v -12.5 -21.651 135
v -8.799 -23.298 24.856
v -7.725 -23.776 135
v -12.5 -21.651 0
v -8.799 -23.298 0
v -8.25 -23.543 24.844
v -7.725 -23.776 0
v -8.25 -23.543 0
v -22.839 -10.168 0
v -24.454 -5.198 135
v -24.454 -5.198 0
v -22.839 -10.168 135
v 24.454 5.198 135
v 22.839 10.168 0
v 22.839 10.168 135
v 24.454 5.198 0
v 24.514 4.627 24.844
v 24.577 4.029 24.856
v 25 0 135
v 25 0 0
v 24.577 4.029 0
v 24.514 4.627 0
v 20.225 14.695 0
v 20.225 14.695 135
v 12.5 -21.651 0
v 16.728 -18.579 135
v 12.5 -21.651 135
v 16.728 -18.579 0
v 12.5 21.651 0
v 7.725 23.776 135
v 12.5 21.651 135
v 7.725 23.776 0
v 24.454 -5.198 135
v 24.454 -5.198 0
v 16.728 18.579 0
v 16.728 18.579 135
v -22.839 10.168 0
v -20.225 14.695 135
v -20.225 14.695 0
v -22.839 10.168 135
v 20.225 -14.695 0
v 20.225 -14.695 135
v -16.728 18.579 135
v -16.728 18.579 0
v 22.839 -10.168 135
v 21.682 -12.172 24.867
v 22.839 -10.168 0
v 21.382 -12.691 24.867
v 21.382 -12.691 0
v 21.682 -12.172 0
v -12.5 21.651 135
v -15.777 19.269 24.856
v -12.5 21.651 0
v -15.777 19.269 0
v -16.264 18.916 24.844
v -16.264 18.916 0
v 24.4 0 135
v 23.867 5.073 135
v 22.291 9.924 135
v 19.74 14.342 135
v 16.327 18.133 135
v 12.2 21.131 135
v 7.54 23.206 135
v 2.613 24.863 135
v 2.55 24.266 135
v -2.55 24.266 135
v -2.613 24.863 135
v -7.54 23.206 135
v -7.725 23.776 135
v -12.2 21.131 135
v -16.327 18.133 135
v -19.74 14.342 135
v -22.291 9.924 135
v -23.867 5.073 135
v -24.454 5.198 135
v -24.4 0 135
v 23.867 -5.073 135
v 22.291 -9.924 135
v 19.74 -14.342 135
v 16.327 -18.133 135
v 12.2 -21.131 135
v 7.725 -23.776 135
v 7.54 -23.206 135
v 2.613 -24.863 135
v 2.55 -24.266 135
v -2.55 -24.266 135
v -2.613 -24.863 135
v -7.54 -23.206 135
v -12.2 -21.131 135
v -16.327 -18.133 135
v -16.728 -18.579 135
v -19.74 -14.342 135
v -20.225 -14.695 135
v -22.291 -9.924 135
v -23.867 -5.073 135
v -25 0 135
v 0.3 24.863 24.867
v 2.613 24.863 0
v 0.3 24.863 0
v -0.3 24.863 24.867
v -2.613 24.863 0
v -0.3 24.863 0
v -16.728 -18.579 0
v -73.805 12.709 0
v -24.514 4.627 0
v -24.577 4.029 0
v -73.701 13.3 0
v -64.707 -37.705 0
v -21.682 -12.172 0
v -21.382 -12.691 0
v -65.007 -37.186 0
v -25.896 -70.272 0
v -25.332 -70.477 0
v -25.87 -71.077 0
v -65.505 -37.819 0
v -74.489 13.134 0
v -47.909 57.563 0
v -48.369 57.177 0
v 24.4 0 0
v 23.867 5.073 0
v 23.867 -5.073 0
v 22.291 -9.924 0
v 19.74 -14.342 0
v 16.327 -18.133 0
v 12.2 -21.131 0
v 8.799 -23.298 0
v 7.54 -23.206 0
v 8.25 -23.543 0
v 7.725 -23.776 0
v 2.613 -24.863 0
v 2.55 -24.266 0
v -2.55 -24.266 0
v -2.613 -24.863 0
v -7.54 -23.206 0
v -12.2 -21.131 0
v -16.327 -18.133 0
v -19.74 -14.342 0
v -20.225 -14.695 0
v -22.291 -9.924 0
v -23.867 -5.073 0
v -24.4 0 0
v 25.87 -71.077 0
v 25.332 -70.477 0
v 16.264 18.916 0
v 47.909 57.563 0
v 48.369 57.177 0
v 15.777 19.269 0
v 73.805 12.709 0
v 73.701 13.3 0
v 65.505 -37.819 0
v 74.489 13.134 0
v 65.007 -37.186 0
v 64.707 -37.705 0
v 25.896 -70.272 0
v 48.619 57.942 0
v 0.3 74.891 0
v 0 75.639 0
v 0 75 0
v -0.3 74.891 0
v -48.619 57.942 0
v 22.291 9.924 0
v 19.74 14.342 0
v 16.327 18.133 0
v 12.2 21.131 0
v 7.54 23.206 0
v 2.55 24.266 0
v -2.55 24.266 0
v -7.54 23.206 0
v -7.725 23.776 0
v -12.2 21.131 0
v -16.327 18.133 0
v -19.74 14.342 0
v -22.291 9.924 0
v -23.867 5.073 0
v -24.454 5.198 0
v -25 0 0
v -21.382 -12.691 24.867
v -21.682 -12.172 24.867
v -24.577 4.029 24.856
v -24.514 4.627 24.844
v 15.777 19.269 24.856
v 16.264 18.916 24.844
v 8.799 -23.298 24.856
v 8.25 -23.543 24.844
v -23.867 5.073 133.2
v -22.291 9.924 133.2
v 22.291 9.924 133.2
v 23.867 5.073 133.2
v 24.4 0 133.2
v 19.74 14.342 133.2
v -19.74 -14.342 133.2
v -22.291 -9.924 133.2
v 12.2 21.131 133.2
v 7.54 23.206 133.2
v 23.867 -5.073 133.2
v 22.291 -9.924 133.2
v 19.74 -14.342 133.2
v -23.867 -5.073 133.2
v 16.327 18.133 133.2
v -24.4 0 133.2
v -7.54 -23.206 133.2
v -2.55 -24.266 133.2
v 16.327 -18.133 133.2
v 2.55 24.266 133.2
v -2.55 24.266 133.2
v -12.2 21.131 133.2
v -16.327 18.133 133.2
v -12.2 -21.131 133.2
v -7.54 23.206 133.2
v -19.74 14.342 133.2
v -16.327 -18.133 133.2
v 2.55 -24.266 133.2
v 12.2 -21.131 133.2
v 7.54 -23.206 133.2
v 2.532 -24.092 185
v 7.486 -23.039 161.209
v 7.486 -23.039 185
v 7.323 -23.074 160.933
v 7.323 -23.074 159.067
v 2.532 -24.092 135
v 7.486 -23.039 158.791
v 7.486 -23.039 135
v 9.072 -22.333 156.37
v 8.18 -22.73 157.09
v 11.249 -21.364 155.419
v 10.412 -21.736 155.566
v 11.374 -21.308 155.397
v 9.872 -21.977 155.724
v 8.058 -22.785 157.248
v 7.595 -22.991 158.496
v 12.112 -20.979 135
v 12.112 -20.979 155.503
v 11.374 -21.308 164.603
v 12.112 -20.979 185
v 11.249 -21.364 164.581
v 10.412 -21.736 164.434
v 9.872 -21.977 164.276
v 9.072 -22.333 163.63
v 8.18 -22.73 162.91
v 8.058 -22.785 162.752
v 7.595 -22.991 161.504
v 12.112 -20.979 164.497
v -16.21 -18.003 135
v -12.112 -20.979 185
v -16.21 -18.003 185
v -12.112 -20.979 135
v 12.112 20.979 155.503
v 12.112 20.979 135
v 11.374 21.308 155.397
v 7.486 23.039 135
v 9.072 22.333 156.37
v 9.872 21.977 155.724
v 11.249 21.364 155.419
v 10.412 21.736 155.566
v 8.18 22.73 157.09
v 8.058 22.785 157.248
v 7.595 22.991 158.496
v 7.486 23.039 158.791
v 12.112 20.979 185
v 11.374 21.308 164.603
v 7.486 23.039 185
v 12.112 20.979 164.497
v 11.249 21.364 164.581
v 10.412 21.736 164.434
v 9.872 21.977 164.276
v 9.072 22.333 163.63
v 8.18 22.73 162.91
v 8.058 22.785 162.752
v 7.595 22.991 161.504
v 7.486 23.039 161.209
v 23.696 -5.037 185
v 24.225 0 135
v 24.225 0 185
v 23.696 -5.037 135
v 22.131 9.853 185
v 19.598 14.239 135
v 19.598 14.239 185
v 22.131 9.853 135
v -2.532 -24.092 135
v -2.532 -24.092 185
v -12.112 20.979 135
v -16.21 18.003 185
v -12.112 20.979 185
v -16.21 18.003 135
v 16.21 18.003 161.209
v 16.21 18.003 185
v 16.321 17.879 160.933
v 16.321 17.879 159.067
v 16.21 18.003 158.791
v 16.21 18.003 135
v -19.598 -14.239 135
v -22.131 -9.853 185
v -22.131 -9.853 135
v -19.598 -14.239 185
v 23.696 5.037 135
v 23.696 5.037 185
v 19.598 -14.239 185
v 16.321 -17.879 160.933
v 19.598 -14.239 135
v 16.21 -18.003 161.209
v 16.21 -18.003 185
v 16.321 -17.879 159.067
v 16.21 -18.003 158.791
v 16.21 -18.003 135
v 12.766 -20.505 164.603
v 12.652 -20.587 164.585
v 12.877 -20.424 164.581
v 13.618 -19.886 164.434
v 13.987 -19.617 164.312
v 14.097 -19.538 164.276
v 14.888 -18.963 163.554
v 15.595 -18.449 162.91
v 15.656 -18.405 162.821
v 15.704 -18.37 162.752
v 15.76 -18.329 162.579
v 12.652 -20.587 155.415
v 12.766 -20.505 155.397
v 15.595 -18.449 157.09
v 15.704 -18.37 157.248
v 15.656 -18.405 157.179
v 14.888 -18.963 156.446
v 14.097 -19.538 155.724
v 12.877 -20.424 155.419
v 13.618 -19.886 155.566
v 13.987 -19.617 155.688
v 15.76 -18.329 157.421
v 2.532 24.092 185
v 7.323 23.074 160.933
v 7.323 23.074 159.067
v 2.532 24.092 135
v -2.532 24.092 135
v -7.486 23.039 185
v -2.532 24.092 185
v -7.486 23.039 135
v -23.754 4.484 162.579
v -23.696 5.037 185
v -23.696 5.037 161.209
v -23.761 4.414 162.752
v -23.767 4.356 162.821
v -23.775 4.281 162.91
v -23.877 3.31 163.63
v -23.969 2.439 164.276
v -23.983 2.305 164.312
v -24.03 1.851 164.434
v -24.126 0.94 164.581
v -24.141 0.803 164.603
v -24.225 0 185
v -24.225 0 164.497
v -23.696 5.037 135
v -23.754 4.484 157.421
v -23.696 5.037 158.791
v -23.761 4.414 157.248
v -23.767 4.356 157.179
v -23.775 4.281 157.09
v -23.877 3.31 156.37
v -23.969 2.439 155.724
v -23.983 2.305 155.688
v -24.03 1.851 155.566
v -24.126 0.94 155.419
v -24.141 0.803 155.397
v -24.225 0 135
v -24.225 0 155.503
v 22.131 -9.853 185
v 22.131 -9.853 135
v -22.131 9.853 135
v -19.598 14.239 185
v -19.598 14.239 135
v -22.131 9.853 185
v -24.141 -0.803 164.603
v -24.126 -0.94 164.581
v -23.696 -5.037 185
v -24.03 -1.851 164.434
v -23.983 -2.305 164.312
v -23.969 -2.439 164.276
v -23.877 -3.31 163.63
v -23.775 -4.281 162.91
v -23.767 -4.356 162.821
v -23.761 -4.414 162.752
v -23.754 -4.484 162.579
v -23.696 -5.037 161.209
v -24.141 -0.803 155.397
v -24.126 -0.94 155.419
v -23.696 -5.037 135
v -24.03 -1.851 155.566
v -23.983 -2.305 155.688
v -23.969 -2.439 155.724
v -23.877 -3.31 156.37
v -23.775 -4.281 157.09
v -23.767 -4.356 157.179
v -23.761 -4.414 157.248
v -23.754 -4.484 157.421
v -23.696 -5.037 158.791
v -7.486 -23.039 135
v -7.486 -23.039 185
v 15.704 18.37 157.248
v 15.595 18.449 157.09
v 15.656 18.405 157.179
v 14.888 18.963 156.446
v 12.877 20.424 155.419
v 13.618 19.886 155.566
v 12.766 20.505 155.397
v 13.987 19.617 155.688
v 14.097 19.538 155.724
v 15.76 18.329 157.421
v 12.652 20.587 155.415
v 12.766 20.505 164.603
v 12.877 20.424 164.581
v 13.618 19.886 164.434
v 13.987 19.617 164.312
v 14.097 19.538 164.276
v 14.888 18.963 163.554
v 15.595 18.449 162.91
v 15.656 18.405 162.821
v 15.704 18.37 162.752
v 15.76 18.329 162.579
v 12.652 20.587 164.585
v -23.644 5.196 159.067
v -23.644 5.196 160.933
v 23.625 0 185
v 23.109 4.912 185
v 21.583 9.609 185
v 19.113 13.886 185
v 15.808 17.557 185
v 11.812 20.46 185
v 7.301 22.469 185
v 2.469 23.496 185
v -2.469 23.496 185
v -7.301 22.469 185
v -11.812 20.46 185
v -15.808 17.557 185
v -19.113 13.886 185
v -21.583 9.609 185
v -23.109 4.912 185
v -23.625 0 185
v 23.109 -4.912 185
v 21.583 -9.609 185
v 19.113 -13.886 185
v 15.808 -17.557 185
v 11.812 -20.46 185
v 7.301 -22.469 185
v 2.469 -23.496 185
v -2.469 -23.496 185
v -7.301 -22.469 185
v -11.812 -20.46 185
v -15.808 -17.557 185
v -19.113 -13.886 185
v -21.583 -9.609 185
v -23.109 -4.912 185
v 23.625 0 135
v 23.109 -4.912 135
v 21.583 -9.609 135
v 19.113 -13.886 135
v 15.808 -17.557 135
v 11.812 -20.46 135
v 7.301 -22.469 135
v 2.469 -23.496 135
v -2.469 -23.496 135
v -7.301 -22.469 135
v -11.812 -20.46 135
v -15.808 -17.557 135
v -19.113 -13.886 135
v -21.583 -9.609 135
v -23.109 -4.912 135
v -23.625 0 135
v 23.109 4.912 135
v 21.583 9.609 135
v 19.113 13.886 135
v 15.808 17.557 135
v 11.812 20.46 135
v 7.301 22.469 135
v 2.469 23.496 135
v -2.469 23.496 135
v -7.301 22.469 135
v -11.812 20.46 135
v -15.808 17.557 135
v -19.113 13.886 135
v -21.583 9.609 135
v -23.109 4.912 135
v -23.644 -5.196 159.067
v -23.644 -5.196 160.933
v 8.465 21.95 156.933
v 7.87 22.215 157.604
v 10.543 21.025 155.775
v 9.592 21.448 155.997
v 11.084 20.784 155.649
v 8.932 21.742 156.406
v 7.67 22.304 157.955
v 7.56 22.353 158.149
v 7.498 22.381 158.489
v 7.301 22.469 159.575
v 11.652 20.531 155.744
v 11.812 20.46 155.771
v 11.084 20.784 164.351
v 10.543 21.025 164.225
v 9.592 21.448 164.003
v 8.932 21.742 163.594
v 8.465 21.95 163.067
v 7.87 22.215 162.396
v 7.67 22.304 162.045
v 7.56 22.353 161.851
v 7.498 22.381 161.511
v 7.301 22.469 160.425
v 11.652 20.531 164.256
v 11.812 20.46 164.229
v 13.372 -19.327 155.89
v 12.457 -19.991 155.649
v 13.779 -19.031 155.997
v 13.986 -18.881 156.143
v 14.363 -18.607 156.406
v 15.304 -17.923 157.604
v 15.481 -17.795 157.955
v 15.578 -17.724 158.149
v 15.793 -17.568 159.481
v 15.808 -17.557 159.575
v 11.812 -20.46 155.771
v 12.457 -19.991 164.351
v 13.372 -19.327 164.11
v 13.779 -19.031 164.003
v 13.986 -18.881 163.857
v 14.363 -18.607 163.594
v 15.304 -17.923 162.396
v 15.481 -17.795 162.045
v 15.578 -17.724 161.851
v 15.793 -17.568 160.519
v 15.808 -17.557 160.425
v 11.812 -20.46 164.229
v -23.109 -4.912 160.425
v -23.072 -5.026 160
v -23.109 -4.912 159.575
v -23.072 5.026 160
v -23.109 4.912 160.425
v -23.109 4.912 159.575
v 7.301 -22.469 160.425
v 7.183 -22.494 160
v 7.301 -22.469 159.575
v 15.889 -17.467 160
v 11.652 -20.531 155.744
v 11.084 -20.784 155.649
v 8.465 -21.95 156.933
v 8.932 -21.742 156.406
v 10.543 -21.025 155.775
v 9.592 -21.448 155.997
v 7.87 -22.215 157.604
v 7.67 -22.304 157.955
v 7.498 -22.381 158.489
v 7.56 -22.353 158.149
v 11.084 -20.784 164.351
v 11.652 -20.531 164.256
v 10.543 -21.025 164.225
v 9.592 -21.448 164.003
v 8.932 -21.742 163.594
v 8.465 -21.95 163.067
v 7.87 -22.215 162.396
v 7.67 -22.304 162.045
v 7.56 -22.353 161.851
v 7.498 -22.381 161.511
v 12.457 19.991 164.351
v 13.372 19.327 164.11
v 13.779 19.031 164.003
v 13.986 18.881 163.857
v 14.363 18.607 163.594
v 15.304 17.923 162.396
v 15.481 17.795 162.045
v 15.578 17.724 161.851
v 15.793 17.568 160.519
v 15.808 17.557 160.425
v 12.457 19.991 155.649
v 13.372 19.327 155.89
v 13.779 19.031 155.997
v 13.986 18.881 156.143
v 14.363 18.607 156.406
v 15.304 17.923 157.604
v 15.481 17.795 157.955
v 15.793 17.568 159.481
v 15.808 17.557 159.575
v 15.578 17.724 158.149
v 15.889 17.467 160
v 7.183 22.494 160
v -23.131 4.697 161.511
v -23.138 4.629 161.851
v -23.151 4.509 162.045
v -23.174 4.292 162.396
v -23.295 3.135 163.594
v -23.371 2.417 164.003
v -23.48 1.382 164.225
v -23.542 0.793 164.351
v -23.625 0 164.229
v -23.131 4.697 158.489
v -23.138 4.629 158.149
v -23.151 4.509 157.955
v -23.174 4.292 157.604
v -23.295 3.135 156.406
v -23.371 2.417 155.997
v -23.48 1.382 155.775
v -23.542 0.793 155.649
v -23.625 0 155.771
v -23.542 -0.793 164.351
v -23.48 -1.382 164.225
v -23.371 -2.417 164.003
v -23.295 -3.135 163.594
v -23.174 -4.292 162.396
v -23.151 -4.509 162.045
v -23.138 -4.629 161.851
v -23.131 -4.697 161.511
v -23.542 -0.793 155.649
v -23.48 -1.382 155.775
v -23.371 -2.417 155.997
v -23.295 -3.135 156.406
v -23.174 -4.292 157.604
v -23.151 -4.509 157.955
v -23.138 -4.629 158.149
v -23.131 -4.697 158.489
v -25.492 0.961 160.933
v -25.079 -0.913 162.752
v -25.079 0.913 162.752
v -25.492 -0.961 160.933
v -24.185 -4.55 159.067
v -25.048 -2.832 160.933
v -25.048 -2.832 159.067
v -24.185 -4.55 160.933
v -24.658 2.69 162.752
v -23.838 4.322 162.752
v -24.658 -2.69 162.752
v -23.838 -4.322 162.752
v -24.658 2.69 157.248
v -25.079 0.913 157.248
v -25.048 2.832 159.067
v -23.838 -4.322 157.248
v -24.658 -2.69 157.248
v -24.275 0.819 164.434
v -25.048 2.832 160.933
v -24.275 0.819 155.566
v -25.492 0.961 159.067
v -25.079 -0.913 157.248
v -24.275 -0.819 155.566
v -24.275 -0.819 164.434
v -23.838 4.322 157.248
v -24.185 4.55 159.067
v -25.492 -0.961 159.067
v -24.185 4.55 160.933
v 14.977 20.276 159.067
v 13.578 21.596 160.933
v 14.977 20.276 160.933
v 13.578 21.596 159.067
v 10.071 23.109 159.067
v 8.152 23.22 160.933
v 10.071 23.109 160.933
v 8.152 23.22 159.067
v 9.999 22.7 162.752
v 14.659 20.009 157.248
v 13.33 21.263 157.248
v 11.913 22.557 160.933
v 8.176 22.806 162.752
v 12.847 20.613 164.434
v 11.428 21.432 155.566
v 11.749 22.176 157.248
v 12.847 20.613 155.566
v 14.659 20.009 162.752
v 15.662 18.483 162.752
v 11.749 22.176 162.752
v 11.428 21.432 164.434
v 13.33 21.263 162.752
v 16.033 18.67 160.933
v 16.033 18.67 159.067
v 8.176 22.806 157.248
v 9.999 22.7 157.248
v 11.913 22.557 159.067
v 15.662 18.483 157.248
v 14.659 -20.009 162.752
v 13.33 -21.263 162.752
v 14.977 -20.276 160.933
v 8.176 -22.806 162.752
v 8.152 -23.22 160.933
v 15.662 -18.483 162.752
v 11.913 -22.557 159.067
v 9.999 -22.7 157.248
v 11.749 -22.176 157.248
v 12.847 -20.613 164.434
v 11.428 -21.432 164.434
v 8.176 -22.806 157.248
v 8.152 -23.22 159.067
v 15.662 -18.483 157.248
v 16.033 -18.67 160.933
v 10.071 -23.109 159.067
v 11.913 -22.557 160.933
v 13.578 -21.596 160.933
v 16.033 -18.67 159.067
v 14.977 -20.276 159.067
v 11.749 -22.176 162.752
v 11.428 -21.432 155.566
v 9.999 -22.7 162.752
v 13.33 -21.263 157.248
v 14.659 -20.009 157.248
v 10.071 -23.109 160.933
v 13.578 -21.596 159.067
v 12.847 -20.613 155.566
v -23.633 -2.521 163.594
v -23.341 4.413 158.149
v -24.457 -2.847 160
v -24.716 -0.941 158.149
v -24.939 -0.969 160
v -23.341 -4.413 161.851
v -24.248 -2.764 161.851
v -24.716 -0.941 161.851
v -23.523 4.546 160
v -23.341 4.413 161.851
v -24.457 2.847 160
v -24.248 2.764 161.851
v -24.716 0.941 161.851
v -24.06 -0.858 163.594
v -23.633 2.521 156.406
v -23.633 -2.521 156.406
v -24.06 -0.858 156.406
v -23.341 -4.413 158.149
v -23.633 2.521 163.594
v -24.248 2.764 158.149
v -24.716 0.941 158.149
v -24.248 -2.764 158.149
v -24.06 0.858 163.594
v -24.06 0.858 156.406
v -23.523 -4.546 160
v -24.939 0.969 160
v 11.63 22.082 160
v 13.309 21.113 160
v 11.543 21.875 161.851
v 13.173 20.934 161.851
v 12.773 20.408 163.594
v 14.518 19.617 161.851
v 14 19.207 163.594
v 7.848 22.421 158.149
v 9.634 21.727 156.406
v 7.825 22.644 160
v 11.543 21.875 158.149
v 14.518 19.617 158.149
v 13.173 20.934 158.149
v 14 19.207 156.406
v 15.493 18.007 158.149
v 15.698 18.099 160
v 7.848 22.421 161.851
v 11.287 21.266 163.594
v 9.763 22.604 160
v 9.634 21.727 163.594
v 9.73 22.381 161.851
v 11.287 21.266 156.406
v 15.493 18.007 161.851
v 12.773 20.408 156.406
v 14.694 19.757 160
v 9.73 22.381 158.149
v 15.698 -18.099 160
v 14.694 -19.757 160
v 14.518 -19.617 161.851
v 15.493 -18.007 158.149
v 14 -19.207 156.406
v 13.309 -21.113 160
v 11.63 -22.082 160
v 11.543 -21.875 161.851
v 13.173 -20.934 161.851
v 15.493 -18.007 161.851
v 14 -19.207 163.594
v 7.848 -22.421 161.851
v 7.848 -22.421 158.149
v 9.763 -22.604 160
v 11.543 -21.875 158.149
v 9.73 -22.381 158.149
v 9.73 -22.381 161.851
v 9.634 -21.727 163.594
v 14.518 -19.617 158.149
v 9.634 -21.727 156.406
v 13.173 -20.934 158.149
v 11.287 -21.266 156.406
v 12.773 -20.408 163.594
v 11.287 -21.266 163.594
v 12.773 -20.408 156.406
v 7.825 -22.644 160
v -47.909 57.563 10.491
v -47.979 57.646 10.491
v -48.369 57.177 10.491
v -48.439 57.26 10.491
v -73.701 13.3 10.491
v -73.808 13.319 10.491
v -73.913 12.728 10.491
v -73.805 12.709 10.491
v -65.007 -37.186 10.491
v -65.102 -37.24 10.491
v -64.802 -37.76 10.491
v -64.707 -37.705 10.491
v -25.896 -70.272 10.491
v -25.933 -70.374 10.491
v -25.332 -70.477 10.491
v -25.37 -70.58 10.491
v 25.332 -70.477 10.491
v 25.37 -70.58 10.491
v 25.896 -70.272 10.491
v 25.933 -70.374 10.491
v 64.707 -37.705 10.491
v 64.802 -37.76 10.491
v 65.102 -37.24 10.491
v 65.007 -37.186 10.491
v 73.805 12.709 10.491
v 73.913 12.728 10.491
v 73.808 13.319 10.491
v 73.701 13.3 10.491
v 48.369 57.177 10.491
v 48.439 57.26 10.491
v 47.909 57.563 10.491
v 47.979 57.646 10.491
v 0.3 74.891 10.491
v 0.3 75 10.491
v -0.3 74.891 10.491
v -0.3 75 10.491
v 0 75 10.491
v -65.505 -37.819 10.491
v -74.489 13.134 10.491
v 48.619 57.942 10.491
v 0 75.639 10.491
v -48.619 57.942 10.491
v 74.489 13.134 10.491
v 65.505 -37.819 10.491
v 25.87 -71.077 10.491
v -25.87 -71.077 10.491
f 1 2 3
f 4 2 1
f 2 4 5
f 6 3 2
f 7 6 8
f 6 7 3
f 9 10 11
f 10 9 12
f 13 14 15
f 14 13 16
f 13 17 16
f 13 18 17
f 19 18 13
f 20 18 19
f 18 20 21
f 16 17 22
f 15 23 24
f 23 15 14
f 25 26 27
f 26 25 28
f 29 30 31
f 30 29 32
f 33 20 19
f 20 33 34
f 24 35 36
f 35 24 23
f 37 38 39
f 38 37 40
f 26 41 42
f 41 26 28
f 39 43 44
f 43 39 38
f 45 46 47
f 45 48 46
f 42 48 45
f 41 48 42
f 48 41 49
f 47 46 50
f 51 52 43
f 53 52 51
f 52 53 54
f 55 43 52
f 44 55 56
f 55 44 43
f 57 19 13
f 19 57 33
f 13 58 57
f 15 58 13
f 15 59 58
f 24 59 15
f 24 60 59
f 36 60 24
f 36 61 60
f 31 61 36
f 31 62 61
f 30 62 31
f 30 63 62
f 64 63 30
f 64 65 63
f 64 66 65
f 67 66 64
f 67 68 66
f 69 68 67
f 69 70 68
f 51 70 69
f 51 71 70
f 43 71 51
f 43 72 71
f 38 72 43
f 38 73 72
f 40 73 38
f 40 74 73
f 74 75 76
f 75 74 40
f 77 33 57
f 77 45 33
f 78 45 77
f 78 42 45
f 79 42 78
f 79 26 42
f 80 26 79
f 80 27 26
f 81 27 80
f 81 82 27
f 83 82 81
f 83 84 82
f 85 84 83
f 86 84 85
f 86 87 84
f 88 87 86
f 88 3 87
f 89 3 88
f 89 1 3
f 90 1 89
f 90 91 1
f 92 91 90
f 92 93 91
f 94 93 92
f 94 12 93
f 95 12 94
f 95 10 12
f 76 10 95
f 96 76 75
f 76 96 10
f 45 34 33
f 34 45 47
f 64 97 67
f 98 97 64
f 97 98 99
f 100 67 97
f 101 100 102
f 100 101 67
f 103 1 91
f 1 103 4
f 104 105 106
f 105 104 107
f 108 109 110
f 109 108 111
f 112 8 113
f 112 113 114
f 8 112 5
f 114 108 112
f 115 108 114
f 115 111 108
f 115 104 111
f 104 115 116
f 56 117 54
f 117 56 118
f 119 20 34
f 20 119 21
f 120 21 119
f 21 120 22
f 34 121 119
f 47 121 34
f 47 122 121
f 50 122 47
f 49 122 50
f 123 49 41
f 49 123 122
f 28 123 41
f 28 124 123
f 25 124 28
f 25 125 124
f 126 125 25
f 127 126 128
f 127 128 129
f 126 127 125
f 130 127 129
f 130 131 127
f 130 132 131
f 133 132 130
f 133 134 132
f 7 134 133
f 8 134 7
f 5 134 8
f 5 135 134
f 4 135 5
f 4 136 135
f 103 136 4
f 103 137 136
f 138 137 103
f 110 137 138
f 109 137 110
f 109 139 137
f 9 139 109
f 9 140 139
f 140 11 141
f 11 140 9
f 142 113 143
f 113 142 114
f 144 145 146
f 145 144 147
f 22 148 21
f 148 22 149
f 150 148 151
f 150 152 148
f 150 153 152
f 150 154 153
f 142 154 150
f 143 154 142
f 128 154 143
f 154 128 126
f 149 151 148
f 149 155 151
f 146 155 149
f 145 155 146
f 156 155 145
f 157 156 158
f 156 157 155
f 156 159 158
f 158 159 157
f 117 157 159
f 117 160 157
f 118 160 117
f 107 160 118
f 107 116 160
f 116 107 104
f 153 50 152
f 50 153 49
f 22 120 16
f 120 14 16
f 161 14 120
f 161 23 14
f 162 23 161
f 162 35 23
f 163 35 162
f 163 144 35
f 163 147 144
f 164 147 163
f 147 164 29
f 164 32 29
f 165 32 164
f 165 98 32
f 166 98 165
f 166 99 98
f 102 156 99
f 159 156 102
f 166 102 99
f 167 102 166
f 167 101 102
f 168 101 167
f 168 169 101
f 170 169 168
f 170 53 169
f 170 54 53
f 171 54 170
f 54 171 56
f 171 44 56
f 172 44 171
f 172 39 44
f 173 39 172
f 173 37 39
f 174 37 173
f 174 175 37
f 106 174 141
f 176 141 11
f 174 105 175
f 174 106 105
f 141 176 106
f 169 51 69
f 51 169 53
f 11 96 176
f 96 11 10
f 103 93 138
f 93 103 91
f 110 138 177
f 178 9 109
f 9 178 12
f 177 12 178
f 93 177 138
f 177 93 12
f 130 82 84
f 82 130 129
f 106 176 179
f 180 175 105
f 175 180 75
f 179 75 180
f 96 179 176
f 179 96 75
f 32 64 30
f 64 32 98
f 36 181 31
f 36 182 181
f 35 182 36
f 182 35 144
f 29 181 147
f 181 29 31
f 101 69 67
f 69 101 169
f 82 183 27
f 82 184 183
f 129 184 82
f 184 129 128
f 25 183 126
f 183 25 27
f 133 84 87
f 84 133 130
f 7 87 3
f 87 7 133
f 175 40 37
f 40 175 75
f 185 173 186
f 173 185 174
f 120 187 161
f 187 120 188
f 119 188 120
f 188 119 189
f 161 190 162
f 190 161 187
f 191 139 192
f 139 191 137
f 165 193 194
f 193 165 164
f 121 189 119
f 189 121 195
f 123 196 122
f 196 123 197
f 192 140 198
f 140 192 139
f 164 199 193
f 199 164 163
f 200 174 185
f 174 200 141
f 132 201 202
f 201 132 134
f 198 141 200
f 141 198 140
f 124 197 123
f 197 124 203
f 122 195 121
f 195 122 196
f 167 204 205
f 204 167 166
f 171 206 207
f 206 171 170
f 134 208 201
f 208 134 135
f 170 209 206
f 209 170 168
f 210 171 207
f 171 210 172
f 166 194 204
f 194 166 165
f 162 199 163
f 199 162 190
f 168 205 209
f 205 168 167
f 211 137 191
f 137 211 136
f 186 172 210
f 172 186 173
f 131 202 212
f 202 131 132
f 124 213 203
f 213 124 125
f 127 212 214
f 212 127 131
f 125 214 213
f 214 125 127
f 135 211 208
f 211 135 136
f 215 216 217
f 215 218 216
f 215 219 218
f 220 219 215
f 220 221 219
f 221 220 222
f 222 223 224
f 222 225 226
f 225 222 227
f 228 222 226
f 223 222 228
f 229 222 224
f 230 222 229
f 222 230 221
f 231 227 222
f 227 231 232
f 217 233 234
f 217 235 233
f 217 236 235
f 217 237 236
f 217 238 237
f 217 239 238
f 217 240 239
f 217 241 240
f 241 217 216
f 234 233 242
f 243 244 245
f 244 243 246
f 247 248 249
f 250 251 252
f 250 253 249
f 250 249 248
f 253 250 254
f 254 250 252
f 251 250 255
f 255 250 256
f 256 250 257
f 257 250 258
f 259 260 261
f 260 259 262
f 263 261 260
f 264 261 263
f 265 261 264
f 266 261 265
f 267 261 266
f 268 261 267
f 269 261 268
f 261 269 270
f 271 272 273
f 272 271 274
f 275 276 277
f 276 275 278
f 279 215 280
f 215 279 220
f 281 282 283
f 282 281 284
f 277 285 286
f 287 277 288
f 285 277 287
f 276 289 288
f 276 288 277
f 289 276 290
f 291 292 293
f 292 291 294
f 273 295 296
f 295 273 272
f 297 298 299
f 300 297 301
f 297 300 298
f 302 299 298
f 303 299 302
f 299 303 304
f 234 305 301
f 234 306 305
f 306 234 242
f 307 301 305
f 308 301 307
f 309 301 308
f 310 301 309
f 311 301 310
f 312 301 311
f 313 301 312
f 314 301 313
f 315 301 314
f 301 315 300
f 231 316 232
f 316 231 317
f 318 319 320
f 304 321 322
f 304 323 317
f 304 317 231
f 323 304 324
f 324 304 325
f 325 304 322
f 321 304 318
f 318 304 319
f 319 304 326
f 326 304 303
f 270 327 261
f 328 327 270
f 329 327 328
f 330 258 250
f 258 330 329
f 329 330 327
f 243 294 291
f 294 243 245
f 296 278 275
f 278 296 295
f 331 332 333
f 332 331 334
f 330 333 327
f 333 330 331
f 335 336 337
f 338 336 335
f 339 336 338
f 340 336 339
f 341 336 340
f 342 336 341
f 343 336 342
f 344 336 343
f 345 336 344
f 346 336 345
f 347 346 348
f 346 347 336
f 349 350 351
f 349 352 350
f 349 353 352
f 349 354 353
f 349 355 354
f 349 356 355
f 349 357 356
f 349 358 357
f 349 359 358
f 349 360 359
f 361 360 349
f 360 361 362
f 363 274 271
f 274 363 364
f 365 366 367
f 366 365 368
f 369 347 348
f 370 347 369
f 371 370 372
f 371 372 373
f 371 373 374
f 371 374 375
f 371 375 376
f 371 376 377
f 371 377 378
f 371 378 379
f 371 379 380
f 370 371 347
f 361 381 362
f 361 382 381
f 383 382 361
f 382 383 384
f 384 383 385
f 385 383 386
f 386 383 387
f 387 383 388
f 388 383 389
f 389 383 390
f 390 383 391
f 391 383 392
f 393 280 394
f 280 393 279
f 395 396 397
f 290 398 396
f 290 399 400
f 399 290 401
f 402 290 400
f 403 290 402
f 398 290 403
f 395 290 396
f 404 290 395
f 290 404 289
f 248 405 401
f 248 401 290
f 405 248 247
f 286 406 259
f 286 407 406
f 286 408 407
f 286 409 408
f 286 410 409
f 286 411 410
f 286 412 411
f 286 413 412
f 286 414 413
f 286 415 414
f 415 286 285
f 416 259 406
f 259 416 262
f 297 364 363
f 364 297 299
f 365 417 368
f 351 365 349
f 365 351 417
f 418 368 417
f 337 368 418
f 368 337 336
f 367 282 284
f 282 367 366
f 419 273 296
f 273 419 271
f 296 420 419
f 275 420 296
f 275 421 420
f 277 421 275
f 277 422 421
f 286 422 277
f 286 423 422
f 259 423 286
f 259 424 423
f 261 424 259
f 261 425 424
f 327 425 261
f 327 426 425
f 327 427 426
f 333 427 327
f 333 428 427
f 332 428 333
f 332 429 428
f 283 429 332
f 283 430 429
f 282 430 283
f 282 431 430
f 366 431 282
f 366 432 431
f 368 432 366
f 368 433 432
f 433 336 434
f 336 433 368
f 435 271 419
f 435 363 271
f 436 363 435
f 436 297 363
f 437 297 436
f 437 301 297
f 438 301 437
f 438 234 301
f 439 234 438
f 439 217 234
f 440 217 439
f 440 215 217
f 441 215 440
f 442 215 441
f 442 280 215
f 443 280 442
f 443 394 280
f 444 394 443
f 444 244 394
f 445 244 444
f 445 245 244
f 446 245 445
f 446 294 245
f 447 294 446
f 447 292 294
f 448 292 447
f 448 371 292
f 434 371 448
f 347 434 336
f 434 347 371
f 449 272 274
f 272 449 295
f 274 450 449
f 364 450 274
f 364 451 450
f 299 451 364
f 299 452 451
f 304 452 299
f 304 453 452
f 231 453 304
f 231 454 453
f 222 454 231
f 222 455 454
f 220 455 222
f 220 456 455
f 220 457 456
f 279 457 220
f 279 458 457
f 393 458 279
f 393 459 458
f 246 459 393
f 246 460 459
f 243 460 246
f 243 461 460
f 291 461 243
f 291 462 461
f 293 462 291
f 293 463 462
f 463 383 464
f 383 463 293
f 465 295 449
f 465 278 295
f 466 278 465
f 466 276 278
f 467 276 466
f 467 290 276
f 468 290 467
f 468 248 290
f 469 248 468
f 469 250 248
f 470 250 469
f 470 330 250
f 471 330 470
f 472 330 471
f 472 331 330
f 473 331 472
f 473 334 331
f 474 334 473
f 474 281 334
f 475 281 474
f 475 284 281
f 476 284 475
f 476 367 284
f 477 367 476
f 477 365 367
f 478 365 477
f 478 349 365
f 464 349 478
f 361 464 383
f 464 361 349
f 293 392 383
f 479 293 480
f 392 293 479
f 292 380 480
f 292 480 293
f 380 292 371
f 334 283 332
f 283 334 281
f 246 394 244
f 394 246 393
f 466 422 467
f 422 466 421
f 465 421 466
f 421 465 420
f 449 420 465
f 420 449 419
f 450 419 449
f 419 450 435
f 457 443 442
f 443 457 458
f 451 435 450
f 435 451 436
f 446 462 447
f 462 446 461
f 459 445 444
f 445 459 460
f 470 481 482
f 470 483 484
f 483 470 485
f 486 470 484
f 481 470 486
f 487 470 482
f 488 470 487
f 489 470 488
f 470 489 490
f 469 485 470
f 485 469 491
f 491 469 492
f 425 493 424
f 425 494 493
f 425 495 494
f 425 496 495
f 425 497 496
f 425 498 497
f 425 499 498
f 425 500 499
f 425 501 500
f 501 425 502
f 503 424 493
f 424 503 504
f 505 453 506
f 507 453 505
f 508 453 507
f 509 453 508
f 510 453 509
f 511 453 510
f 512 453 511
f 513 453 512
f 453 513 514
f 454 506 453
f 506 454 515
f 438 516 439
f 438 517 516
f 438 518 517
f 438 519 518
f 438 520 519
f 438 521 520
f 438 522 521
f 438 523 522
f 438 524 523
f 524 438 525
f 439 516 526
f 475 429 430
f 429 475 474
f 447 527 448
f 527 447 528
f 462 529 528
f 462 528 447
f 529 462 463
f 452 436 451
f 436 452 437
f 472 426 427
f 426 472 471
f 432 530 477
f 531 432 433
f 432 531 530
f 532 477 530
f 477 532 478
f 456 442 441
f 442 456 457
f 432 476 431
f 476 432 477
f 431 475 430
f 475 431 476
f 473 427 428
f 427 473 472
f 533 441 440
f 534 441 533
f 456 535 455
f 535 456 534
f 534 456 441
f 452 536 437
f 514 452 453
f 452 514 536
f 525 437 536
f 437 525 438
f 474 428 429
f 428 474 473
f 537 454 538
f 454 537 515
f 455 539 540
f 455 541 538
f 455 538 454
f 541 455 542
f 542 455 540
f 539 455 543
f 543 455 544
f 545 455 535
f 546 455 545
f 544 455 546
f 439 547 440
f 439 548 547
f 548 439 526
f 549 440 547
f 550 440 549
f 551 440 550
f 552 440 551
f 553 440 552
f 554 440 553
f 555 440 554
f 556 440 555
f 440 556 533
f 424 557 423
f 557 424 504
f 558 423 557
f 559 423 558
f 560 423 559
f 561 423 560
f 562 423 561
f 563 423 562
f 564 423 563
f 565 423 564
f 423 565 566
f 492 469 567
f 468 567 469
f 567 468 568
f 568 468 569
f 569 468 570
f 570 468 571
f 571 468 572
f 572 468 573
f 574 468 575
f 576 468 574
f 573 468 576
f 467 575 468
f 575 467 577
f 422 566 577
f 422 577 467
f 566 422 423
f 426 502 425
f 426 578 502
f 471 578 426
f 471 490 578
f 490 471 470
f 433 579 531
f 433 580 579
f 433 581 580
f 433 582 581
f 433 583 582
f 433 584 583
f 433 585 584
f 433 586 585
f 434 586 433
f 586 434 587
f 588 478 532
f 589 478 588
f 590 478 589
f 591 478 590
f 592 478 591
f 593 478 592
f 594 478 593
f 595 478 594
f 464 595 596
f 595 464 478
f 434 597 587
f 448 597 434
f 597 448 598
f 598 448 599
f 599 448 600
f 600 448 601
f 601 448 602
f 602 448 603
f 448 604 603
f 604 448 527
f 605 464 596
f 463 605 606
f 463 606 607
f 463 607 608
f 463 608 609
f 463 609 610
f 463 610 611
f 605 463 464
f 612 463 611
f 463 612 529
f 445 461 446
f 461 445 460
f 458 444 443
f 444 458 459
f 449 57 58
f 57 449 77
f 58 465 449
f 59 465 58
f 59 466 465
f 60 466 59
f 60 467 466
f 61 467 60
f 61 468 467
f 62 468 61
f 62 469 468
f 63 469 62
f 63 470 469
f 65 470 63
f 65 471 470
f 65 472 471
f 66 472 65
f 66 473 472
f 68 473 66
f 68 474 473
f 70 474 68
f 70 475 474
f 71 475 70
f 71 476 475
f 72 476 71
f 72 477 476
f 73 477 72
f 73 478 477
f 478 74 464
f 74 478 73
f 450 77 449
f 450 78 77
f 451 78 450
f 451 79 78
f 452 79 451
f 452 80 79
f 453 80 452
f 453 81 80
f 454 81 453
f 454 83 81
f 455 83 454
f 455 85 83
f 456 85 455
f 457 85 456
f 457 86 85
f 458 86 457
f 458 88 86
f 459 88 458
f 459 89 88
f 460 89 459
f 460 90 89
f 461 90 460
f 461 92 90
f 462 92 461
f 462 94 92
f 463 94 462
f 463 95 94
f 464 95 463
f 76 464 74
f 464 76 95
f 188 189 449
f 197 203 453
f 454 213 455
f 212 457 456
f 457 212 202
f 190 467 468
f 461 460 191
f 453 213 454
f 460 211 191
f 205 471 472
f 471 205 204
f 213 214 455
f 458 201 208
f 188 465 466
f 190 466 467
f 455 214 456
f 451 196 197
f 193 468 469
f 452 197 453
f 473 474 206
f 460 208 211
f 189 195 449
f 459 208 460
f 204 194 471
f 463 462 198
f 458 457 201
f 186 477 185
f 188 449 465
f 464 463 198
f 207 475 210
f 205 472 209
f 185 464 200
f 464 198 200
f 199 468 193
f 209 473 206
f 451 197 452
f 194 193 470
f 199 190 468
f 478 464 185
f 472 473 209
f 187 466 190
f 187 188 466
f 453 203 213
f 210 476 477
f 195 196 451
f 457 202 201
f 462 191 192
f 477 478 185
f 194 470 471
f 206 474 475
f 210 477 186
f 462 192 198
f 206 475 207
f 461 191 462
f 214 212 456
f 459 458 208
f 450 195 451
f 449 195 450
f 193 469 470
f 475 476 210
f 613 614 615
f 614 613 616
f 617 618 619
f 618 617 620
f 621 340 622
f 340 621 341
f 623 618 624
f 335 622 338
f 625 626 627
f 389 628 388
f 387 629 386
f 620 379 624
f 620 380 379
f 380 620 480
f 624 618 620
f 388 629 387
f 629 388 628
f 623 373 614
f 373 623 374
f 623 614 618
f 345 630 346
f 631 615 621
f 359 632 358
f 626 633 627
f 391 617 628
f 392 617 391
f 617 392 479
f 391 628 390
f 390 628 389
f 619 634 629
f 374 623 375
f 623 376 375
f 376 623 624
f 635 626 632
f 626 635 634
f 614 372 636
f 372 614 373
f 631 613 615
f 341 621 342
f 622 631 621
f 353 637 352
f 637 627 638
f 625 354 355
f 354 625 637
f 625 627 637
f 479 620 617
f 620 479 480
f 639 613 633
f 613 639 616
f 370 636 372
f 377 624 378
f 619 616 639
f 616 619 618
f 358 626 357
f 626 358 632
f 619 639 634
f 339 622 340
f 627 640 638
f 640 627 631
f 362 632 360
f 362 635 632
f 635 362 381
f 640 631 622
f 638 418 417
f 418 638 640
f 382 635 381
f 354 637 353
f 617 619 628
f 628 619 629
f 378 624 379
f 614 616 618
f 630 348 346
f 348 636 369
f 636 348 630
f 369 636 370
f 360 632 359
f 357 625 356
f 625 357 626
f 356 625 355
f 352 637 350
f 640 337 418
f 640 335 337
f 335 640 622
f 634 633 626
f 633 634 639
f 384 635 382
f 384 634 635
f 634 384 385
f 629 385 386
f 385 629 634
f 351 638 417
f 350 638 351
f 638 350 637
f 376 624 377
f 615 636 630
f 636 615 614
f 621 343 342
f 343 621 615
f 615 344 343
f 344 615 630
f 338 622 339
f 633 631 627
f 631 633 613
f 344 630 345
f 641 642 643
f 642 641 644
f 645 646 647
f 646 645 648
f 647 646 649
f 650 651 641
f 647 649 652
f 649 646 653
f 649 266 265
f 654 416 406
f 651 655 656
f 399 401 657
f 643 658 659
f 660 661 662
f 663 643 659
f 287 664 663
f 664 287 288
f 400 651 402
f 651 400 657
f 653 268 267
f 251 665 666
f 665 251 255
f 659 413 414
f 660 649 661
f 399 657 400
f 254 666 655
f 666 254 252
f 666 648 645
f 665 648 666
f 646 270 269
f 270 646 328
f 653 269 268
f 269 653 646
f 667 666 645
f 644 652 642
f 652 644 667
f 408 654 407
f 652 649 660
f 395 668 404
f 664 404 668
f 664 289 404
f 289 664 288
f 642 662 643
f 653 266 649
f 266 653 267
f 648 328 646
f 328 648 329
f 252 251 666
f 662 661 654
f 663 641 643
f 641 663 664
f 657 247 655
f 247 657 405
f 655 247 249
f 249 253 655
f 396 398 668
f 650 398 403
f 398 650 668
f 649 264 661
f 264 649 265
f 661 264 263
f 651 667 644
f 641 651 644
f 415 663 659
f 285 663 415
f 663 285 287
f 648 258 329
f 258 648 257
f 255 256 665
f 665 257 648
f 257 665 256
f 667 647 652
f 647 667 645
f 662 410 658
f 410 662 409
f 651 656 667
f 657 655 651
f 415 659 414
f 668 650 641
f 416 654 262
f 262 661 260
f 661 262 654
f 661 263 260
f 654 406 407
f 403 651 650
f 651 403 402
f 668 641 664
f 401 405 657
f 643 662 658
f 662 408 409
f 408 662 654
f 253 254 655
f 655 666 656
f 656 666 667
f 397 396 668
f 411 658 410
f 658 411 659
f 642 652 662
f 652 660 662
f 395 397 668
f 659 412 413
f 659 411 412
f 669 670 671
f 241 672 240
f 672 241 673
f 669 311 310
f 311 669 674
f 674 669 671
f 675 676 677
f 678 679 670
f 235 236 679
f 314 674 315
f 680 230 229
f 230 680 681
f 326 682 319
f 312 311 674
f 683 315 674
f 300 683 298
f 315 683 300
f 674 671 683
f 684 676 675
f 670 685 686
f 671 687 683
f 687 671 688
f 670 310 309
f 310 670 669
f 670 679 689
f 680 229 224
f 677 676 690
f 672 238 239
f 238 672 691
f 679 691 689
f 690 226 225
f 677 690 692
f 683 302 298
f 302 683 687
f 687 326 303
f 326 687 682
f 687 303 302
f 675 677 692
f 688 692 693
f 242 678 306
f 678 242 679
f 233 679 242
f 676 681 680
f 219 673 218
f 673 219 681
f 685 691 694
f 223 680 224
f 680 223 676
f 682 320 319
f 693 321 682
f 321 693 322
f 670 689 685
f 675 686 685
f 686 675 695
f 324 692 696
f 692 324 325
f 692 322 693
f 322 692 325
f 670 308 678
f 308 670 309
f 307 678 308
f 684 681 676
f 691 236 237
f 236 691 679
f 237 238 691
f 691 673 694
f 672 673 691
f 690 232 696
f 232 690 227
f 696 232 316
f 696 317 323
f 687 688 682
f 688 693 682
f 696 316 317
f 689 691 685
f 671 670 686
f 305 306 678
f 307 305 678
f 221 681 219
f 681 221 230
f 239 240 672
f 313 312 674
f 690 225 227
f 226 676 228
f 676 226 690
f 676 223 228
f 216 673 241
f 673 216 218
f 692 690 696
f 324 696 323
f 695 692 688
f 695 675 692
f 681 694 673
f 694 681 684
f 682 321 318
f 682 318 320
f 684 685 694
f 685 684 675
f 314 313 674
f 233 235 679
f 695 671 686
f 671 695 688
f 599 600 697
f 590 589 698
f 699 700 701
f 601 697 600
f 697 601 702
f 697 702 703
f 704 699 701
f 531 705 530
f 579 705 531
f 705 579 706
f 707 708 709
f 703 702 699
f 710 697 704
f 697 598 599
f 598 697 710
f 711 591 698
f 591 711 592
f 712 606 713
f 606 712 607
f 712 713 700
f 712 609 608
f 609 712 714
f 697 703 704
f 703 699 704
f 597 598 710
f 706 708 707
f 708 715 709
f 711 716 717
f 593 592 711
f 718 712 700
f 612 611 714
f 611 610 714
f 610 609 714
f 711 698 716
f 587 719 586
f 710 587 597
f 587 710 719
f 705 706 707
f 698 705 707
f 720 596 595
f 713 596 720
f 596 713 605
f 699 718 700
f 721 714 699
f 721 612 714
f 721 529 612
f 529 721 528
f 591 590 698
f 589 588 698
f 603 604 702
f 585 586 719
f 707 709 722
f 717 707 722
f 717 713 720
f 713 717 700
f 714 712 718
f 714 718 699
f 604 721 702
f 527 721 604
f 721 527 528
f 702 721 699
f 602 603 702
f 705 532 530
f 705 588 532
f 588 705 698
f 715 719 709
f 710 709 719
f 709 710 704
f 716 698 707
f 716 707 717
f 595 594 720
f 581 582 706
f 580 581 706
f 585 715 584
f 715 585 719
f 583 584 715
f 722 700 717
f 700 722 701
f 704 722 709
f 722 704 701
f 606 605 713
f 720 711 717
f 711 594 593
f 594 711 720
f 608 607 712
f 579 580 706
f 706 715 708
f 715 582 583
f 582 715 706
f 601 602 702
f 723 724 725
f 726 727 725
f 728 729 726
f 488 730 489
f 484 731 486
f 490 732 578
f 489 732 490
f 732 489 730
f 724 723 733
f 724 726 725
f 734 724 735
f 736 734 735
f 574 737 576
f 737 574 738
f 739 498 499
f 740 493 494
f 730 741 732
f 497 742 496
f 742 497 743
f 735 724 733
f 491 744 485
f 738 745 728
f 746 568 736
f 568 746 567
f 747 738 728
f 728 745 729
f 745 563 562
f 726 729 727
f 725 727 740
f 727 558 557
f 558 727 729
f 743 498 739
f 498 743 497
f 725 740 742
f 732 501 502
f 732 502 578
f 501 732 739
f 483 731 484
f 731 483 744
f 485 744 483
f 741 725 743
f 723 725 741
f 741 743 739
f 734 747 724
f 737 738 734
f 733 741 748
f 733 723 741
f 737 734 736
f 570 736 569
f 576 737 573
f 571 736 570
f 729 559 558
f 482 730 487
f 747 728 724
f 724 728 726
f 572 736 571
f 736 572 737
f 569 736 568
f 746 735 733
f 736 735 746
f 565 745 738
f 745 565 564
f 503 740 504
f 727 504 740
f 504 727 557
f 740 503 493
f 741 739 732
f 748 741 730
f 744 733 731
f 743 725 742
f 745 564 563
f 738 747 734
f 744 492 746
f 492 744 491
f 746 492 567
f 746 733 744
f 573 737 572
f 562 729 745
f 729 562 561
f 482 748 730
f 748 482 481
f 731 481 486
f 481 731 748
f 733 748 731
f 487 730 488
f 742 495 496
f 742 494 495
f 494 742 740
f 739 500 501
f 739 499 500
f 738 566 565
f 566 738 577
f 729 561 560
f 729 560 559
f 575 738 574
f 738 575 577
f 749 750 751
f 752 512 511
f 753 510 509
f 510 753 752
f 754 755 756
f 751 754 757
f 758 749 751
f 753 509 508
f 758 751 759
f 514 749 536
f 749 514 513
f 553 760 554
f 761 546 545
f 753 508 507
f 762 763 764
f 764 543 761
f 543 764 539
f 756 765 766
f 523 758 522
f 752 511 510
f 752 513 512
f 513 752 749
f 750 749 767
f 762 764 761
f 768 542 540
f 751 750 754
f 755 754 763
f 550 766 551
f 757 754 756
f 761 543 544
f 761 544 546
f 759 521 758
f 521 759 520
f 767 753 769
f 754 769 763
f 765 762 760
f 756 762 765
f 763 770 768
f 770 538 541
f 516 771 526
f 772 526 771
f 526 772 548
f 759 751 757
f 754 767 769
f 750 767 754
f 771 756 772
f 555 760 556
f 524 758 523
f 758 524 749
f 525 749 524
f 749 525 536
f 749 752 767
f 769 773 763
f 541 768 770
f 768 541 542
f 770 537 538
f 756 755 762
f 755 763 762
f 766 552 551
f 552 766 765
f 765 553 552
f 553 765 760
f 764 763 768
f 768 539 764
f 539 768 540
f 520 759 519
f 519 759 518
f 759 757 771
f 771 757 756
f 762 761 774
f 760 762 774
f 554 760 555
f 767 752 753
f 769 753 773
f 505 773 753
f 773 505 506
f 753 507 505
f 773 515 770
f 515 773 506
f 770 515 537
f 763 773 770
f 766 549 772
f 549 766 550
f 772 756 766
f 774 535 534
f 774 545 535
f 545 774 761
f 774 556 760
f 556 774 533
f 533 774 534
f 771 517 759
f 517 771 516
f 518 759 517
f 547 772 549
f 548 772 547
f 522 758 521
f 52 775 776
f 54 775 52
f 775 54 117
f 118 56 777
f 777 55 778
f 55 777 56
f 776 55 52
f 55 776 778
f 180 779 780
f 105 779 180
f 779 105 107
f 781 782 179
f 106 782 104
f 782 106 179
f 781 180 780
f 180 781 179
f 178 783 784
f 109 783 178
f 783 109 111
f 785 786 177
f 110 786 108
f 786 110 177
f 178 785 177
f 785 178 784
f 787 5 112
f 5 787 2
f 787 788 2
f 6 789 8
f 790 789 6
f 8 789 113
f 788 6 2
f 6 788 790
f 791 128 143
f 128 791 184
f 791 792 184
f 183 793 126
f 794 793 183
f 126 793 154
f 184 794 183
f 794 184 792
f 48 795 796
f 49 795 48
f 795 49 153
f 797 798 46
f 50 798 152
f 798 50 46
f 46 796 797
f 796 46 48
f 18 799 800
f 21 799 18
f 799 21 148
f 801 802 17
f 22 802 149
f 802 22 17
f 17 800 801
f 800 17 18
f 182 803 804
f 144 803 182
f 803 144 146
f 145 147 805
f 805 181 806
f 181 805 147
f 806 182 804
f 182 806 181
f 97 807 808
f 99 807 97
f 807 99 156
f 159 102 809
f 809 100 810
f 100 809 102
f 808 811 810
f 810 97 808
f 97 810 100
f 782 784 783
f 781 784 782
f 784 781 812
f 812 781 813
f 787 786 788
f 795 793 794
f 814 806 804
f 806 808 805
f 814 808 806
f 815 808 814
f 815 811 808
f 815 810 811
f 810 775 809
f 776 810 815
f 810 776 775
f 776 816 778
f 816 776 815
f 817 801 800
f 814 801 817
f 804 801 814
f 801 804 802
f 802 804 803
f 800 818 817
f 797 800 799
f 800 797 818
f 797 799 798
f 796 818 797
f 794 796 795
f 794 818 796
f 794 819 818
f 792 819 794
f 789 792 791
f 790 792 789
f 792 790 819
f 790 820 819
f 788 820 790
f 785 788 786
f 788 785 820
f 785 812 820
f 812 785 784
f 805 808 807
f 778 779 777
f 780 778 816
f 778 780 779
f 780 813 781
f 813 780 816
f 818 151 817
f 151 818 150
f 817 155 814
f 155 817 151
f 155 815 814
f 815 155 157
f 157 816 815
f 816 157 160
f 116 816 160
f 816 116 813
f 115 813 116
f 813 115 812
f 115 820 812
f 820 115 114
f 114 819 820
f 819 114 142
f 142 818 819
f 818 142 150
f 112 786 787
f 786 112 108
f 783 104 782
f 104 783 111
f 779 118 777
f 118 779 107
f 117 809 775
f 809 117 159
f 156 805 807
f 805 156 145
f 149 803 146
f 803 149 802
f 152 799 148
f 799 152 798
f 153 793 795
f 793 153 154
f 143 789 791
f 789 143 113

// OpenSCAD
// file: global_parameters.scad
radius = 50 / 2;
clear = 0.175;

wall = 0.6;
rib_wall = 0.6;
rib_count = 18;

connection_lenght = radius*2;

resolution = 150;

stage_height = 185;

cone_height = 3.14 * radius;
cone_connection_height = connection_lenght / 2;
WALL_TH = 1;
STAGE_H = 185;

KINDERJOINT_H = 30;
KINDERJOINT_BALL_R = 15;
KINDERJOINT_BALL_TH = 2;

NOSECONE_H = 60;
NOSECONE_JOINT_H = 20;

ARACHUTE_BOWL_DEPTH = 50;
// file: library.scad
function sq(x) = x * x;

module ogive_nose_cone(radius, height, slices = 10, thickness = -1) {   //create ogive nose cone with rounded top tip
    
    rounding_level = height -  4*thickness;

    ogive_radius = (height * height + radius * radius) / (2 * radius);
    
    center_x = -ogive_radius + radius;
    center_y = 0;
    
    d = height / slices;
    rounding_sphere_radius = thickness*3;
    rounding_radius = w(rounding_level, ogive_radius); // radius of cone at rounding level

    rounding_sphere_height = rounding_sphere_radius - sqrt(sq(rounding_sphere_radius) - sq(rounding_radius));
    
    echo("rounding_sphere_height=", rounding_sphere_height);
    
    function w(y, r) = center_x + sqrt(
        (r * r) - (y * y)
    );
    
    
    difference () {
        rotate_extrude ($fn = slices)
        difference () {
            polygon(
                points = concat([
                    [0, height],
                    [0, 0],
                    [radius, 0]
                ],
                [ for (i = [0 : (slices - 1)]) [w(i * d, ogive_radius), i * d] ]),
                paths = [ [ for (i = [0 : (slices + 2)]) i ] ]
            );
            
            if (thickness > 0) {
                polygon(
                    points = concat([
                        [0, sqrt(sq(ogive_radius - thickness) - sq(ogive_radius - radius))],
                        [0, 0],
                        [radius - thickness, 0]
                    ],
                    [ for (i = [0 : (slices - 1)]) [w(i * d, ogive_radius - thickness), i * d] ]),
                    paths = [ [ for (i = [0 : (slices + 2)]) i ] ]
                );
            }
        }
        
        translate([0, 0 , rounding_level])      // top rounding to make the cone printable. 
        cylinder(r = radius, h = height);
    }
    translate([0, 0 , rounding_level])
    intersection() {
        cylinder(r=radius, h=height);
        translate([0, 0 , - rounding_sphere_radius + rounding_sphere_height ])
        sphere(rounding_sphere_radius, $fn=slices);
    }
}


module ring(radius, width, height) {
	difference () {
		cylinder(r = radius, h = height);
		translate([0, 0, -1])
		cylinder(r = radius - width, h = height + 2);
	}
}


module ccube(width, depth, height, z_center = false) {
	if (z_center) {
		translate([-width / 2, -depth / 2, -height / 2])
		cube([width, depth, height]);
	} else {
		translate([-width / 2, -depth / 2, 0])
		cube([width, depth, height]);
	}
}

module twisted_ribs(outer_r, inner_r, height, twist, count, wall) {
	angle = 360 / count;
	linear_extrude(height, twist = twist, slices = 20) {
		for (i = [0 : (count - 1)]) {
			rotate([0, 0, i * angle])
			translate([0, inner_r])
			square([wall, wall]);
		}
	}
}

/*
ccube(100, 100, 10);
ring(50, 5, 20);
ring(50, 2, 30);
*/

module screw_anchor(outer_r, inner_r, depth, height, wall) {
	rotate([30, 0, 0])
	difference () {
		//translate([-outer_r / 2 - wall, outer_r / 2, 0])
		translate([-outer_r - wall, -wall, 0])
		cube([(outer_r + wall) * 2, depth, height]);

		//ccube(outer_r + wall * 2, outer_r + wall * 2, height);
		translate([0, outer_r, 0]) {
		cylinder(r = outer_r, h = height / 2);
		cylinder(r = inner_r, h = height);
		
		translate([-outer_r, 0, 0])
		cube([outer_r * 2, depth, height / 2]);
		}
	}
}

module tube(wall_thickness, radius, lenght) {
    difference() {
        cylinder(r = radius + wall_thickness * 2, h = lenght);
        translate([0, 0, -0.05]) cylinder(r = radius, h = lenght + 0.1);
    }
}

module tube_twists_in(wall_thickness, radius, lenght, teeth_twist, teeth_count, teeth_size) {
    difference () {
        twisted_ribs(radius, radius - teeth_size, lenght, teeth_twist, teeth_count, teeth_size);						
        cylinder(r1 = radius - lenght, r2 = radius - wall_thickness, h = lenght);
    }
    tube(wall_thickness, radius, lenght);
    
}

module nozzle_die(wall_thickness, radius, nozzle_lenght, r_throat, r_outcome) {
difference () {
    union () {
        cylinder(r = radius + wall_thickness + 2, h = wall_thickness);    
        translate([0, 0, wall_thickness]) cylinder(r = radius, h = 2.5);
        translate([0, 0, wall_thickness + 2.5])cylinder(r1 = radius, r2 = r_outcome, h = nozzle_lenght / 2);
        translate([0, 0, wall_thickness + nozzle_lenght / 2 + 2.5])cylinder(r1 = r_outcome, r2 = r_throat, h = nozzle_lenght);
    }
    cylinder(r = r_throat, h = 3*nozzle_lenght);
}
}


/*
THICKNESS = 1.1;
RADIUS = 15;
NOZZLE_THROAT_RADIUS = 6/2;
NOZZLE_OUTCOME_RADIUS = 10/2;
NOZZLE_LENGHT = 10;
TOLERANCE = 0.5;
$fn = 100;



color([0, 0, 1]) nozzle_die(THICKNESS, RADIUS - TOLERANCE, NOZZLE_LENGHT, NOZZLE_THROAT_RADIUS, NOZZLE_OUTCOME_RADIUS);
*/


module concentric_cylinders(r, l, thickness, cylinders, spacing) {
    for(i = [0 : cylinders - 1]) {
        tube(thickness, i * (spacing + thickness) + r, l);
    }
}

module pcb_holder (pcb_height, pcb_width, pcb_depth, pcb_holder_overlap, wall_thickness, bottom_thickness, radius)
{
	translate([-radius,-wall_thickness - pcb_depth/2,0])
	{
		difference()
		{
			cube([radius*2, wall_thickness * 2 + pcb_depth, pcb_height + bottom_thickness]);
			union()
			{
				translate([radius - pcb_width/2,wall_thickness,bottom_thickness]) cube([pcb_width, pcb_depth, pcb_height + 0.05]);
				translate([radius - pcb_width/2 + pcb_holder_overlap,-0.05,-0.05]) cube([pcb_width - 2*pcb_holder_overlap,wall_thickness * 2 + pcb_depth+0.1,pcb_height + bottom_thickness+0.1]);
				translate([radius,wall_thickness + pcb_depth/2,-0.05]) tube(radius - pcb_width/2, radius, pcb_height + bottom_thickness+0.1);
			}
		}
	}
}

module triangle_3d(lenght, width, height)
{
	polyhedron(
	points=[[0,0,0],[lenght,0,0],[lenght,width,0],[0,width,0],[0,0,height],[lenght,0,height]],
	faces=[[0,1,2,3],[0,4,5,1],[5,4,3,2],[5,2,1],[3,4,0]]);
}
module pcb_holder_supports(pcb_height, pcb_width, pcb_depth, pcb_holder_overlap, wall_thickness, bottom_thickness, radius, support_height)
{
	translate([0,0,support_height]) pcb_holder(pcb_height, pcb_width, pcb_depth, pcb_holder_overlap, wall_thickness, bottom_thickness, radius);
	difference()
	{
		union()
		{
			translate([radius,wall_thickness + pcb_depth/2,support_height]) rotate([180,0,270]) triangle_3d(wall_thickness * 2 + pcb_depth, radius - pcb_width/2 + pcb_holder_overlap, support_height);
			mirror([1,0,0]) translate([radius,wall_thickness + pcb_depth/2,support_height]) rotate([180,0,270]) triangle_3d(wall_thickness * 2 + pcb_depth, radius - pcb_width/2 + pcb_holder_overlap, support_height);
		}
		tube(radius - pcb_width/2, radius, pcb_height + bottom_thickness+0.1);
	}
}

module parachute_bowl (radius, bottom_thickness, wall_thickness, bowl_depth ,edge_width ,edge_height)
{
	cylinder(r=radius+wall_thickness, h=bottom_thickness);
	translate([0,0,bottom_thickness]) 
tube(wall_thickness, radius, bowl_depth - edge_height);
	translate([0,0,bottom_thickness+bowl_depth-edge_height]) tube(edge_width+wall_thickness,radius, edge_height);
}

module kinderjoint_m(r, h, ball_r, ball_th) {
    cylinder(r = r, h = h);    
    translate([r - ball_r + ball_th , 0, h / 2 ]) sphere(r = ball_r);
    rotate([0, 0, 120]) translate([r - ball_r + ball_th , 0, h / 2 ]) sphere(r = ball_r);
    rotate([0, 0, -120]) translate([r - ball_r + ball_th , 0, h / 2 ]) sphere(r = ball_r);
}

module kinderjoint_m_hollow(r, h, ball_r, ball_th, wall_th) {
    difference() {
        kinderjoint_m(r + wall_th * 2, h, ball_r, ball_th);
        translate([0, 0, -0.05]) cylinder(r = r, h = h + 0.1);
    }
}

module kinderjoint_f(r, h, ball_r, ball_th, wall_th) {
    difference() {
        kinderjoint_m(r + wall_th * 2, h, ball_r + wall_th, ball_th + wall_th);
        translate([0, 0, -0.05]) kinderjoint_m(r, h + 0.1, ball_r, ball_th);
    }
}
// main file
use <library.scad>
include <global_parameters.scad>

inner_radius = 32 / 2;
height = stage_height;
motor_top = 173;
motor_bottom = 10;
fin_num = 9;

// classic fins
fin_r = radius + 50;
fin_h = 25;
fin_angle = 16;


module motor_holder(wall) {
	translate([0, 0, -wall * 3])
	cylinder(r = radius - wall - clear, h = wall * 3);    
}


module inner_ring(angle = 11, segments) {
    rotate([0, 0, angle])
    //translate([0, 0, -wall * 3])
    difference () {
        cylinder(r = inner_radius + wall*3, h = wall*2);
        cylinder(r = inner_radius + wall, h = wall*2);
    }
}


module fins(outer_r, inner_r, wall, height, count, angle) {
    for (i = [1 : count]) {
        rotate([0, 0, i * 360/count])
        translate([-wall / 2, inner_r, 0])
        difference () {
            cube([wall, outer_r - inner_r, height]);
          
            color("red")
            translate([-1, 0, height])
            rotate([-angle, 0, 0])
            cube([wall + 2, (outer_r - inner_r) + height, height]);
        }
    }
    inner_points = [ for (i = [0 : count - 1]) [sin(i * 360/count) * (outer_r) , cos(i * 360/count) * (outer_r)]];
    // calculate coordinates of external fins polygon
    vertex_angle = (180*(count-2)) / count;   // angle in external fins polygon corner.
    outer_points = [ for (i = [0 : count - 1]) [sin(i * 360/count) * (outer_r + wall/sin(vertex_angle/2)) , cos(i * 360/count) * (outer_r + wall/sin(vertex_angle/2))]];
    polygon_paths = [ [ for (i = [0 : count-1]) i ], [ for (i = [count : 2*count-1]) i ]];

    echo("outer points = ", outer_points);
    echo("inner points = ", inner_points);
    echo("paths = ", polygon_paths);
    echo("vertex_angle = ", vertex_angle);
    
    linear_extrude(height = height - (tan(angle)*(outer_r - inner_r)))
        polygon(
            points =  concat(outer_points, inner_points),
            paths = polygon_paths
        );
}


module hull(radius, inner_radius, height, wall, motor_bottom, connection_lenght) {
	difference () {                 // hull shell
		cylinder(r = radius, h = height - connection_lenght);
		cylinder(r = radius - wall, h = height - connection_lenght);
	}

/*
	difference () {
		union () {
			twisted_ribs(
				radius - (wall / 2),
				inner_radius,
				height,
				90,
				rib_count,
				rib_wall
			);						
		}
		
                cylinder(               // bevel inner ring for motor exhaust. 
			r1 = radius - wall,
			r2 = inner_radius,
			h = motor_bottom
		);
                
// connection to the next rocket stage
                translate([0, 0, height - connection_lenght])   // remove ribs to place stage connection section
                difference () {                
                        cylinder(r = radius, h = connection_lenght , $fn=resolution);
                        cylinder(r = radius- 1.5*wall, h = connection_lenght, $fn=resolution);
                }
        }*/

        translate([0, 0, height - connection_lenght])
        difference () {                 // hull shell
                cylinder(r = radius - wall - clear, h = connection_lenght);
                cylinder(r = radius - 2*wall - clear, h = connection_lenght);
        }

        translate([0, 0, height - connection_lenght - 3*wall])        // bevel between connection and hull
        difference () {                
            cylinder(r=radius, h=3*wall);
            cylinder(r1=radius - wall, r2=radius - 2*wall - clear, h=3*wall);
        }        
}

module lock_out(radius, inner_radius, height, wall, clear, connection_lenght){
		translate([-radius+radius/3-wall,0,height-connection_lenght/2])
		sphere(r=radius/3);
		rotate([0,0,-360/3])
		translate([-radius+radius/3-wall,0,height-connection_lenght/2])
		sphere(r=radius/3);
		rotate([0,0,360/3])
		translate([-radius+radius/3-wall,0,height-connection_lenght/2])
		sphere(r=radius/3);
}

module lock_in(radius, inner_radius, height, wall, clear, connection_lenght){
		translate([-radius+radius/3-wall,0,height-connection_lenght/2])
		sphere(r=radius/3-wall);
		rotate([0,0,-360/3])
		translate([-radius+radius/3-wall,0,height-connection_lenght/2])
		sphere(r=radius/3-wall);
		rotate([0,0,360/3])
		translate([-radius+radius/3-wall,0,height-connection_lenght/2])
		sphere(r=radius/3-wall);
		translate([0,0,height-(connection_lenght/2)-(radius/3) ])
		cylinder(r=radius-2*wall-clear, h=(radius/3)*2);
}

module engine_stage () {
    difference () {
	    union () {
		    hull(radius, inner_radius, height, wall, motor_bottom, connection_lenght);
		    //translate([0, 0, motor_top]) motor_holder(wall);
			lock_out(radius, inner_radius, height, wall, clear, connection_lenght);
	    }
		union(){
			lock_in(radius, inner_radius, height, wall, clear, connection_lenght);
			
		}
    }

    fins(fin_r, radius - wall, wall , fin_h, fin_num, fin_angle);
}

engine_stage();
